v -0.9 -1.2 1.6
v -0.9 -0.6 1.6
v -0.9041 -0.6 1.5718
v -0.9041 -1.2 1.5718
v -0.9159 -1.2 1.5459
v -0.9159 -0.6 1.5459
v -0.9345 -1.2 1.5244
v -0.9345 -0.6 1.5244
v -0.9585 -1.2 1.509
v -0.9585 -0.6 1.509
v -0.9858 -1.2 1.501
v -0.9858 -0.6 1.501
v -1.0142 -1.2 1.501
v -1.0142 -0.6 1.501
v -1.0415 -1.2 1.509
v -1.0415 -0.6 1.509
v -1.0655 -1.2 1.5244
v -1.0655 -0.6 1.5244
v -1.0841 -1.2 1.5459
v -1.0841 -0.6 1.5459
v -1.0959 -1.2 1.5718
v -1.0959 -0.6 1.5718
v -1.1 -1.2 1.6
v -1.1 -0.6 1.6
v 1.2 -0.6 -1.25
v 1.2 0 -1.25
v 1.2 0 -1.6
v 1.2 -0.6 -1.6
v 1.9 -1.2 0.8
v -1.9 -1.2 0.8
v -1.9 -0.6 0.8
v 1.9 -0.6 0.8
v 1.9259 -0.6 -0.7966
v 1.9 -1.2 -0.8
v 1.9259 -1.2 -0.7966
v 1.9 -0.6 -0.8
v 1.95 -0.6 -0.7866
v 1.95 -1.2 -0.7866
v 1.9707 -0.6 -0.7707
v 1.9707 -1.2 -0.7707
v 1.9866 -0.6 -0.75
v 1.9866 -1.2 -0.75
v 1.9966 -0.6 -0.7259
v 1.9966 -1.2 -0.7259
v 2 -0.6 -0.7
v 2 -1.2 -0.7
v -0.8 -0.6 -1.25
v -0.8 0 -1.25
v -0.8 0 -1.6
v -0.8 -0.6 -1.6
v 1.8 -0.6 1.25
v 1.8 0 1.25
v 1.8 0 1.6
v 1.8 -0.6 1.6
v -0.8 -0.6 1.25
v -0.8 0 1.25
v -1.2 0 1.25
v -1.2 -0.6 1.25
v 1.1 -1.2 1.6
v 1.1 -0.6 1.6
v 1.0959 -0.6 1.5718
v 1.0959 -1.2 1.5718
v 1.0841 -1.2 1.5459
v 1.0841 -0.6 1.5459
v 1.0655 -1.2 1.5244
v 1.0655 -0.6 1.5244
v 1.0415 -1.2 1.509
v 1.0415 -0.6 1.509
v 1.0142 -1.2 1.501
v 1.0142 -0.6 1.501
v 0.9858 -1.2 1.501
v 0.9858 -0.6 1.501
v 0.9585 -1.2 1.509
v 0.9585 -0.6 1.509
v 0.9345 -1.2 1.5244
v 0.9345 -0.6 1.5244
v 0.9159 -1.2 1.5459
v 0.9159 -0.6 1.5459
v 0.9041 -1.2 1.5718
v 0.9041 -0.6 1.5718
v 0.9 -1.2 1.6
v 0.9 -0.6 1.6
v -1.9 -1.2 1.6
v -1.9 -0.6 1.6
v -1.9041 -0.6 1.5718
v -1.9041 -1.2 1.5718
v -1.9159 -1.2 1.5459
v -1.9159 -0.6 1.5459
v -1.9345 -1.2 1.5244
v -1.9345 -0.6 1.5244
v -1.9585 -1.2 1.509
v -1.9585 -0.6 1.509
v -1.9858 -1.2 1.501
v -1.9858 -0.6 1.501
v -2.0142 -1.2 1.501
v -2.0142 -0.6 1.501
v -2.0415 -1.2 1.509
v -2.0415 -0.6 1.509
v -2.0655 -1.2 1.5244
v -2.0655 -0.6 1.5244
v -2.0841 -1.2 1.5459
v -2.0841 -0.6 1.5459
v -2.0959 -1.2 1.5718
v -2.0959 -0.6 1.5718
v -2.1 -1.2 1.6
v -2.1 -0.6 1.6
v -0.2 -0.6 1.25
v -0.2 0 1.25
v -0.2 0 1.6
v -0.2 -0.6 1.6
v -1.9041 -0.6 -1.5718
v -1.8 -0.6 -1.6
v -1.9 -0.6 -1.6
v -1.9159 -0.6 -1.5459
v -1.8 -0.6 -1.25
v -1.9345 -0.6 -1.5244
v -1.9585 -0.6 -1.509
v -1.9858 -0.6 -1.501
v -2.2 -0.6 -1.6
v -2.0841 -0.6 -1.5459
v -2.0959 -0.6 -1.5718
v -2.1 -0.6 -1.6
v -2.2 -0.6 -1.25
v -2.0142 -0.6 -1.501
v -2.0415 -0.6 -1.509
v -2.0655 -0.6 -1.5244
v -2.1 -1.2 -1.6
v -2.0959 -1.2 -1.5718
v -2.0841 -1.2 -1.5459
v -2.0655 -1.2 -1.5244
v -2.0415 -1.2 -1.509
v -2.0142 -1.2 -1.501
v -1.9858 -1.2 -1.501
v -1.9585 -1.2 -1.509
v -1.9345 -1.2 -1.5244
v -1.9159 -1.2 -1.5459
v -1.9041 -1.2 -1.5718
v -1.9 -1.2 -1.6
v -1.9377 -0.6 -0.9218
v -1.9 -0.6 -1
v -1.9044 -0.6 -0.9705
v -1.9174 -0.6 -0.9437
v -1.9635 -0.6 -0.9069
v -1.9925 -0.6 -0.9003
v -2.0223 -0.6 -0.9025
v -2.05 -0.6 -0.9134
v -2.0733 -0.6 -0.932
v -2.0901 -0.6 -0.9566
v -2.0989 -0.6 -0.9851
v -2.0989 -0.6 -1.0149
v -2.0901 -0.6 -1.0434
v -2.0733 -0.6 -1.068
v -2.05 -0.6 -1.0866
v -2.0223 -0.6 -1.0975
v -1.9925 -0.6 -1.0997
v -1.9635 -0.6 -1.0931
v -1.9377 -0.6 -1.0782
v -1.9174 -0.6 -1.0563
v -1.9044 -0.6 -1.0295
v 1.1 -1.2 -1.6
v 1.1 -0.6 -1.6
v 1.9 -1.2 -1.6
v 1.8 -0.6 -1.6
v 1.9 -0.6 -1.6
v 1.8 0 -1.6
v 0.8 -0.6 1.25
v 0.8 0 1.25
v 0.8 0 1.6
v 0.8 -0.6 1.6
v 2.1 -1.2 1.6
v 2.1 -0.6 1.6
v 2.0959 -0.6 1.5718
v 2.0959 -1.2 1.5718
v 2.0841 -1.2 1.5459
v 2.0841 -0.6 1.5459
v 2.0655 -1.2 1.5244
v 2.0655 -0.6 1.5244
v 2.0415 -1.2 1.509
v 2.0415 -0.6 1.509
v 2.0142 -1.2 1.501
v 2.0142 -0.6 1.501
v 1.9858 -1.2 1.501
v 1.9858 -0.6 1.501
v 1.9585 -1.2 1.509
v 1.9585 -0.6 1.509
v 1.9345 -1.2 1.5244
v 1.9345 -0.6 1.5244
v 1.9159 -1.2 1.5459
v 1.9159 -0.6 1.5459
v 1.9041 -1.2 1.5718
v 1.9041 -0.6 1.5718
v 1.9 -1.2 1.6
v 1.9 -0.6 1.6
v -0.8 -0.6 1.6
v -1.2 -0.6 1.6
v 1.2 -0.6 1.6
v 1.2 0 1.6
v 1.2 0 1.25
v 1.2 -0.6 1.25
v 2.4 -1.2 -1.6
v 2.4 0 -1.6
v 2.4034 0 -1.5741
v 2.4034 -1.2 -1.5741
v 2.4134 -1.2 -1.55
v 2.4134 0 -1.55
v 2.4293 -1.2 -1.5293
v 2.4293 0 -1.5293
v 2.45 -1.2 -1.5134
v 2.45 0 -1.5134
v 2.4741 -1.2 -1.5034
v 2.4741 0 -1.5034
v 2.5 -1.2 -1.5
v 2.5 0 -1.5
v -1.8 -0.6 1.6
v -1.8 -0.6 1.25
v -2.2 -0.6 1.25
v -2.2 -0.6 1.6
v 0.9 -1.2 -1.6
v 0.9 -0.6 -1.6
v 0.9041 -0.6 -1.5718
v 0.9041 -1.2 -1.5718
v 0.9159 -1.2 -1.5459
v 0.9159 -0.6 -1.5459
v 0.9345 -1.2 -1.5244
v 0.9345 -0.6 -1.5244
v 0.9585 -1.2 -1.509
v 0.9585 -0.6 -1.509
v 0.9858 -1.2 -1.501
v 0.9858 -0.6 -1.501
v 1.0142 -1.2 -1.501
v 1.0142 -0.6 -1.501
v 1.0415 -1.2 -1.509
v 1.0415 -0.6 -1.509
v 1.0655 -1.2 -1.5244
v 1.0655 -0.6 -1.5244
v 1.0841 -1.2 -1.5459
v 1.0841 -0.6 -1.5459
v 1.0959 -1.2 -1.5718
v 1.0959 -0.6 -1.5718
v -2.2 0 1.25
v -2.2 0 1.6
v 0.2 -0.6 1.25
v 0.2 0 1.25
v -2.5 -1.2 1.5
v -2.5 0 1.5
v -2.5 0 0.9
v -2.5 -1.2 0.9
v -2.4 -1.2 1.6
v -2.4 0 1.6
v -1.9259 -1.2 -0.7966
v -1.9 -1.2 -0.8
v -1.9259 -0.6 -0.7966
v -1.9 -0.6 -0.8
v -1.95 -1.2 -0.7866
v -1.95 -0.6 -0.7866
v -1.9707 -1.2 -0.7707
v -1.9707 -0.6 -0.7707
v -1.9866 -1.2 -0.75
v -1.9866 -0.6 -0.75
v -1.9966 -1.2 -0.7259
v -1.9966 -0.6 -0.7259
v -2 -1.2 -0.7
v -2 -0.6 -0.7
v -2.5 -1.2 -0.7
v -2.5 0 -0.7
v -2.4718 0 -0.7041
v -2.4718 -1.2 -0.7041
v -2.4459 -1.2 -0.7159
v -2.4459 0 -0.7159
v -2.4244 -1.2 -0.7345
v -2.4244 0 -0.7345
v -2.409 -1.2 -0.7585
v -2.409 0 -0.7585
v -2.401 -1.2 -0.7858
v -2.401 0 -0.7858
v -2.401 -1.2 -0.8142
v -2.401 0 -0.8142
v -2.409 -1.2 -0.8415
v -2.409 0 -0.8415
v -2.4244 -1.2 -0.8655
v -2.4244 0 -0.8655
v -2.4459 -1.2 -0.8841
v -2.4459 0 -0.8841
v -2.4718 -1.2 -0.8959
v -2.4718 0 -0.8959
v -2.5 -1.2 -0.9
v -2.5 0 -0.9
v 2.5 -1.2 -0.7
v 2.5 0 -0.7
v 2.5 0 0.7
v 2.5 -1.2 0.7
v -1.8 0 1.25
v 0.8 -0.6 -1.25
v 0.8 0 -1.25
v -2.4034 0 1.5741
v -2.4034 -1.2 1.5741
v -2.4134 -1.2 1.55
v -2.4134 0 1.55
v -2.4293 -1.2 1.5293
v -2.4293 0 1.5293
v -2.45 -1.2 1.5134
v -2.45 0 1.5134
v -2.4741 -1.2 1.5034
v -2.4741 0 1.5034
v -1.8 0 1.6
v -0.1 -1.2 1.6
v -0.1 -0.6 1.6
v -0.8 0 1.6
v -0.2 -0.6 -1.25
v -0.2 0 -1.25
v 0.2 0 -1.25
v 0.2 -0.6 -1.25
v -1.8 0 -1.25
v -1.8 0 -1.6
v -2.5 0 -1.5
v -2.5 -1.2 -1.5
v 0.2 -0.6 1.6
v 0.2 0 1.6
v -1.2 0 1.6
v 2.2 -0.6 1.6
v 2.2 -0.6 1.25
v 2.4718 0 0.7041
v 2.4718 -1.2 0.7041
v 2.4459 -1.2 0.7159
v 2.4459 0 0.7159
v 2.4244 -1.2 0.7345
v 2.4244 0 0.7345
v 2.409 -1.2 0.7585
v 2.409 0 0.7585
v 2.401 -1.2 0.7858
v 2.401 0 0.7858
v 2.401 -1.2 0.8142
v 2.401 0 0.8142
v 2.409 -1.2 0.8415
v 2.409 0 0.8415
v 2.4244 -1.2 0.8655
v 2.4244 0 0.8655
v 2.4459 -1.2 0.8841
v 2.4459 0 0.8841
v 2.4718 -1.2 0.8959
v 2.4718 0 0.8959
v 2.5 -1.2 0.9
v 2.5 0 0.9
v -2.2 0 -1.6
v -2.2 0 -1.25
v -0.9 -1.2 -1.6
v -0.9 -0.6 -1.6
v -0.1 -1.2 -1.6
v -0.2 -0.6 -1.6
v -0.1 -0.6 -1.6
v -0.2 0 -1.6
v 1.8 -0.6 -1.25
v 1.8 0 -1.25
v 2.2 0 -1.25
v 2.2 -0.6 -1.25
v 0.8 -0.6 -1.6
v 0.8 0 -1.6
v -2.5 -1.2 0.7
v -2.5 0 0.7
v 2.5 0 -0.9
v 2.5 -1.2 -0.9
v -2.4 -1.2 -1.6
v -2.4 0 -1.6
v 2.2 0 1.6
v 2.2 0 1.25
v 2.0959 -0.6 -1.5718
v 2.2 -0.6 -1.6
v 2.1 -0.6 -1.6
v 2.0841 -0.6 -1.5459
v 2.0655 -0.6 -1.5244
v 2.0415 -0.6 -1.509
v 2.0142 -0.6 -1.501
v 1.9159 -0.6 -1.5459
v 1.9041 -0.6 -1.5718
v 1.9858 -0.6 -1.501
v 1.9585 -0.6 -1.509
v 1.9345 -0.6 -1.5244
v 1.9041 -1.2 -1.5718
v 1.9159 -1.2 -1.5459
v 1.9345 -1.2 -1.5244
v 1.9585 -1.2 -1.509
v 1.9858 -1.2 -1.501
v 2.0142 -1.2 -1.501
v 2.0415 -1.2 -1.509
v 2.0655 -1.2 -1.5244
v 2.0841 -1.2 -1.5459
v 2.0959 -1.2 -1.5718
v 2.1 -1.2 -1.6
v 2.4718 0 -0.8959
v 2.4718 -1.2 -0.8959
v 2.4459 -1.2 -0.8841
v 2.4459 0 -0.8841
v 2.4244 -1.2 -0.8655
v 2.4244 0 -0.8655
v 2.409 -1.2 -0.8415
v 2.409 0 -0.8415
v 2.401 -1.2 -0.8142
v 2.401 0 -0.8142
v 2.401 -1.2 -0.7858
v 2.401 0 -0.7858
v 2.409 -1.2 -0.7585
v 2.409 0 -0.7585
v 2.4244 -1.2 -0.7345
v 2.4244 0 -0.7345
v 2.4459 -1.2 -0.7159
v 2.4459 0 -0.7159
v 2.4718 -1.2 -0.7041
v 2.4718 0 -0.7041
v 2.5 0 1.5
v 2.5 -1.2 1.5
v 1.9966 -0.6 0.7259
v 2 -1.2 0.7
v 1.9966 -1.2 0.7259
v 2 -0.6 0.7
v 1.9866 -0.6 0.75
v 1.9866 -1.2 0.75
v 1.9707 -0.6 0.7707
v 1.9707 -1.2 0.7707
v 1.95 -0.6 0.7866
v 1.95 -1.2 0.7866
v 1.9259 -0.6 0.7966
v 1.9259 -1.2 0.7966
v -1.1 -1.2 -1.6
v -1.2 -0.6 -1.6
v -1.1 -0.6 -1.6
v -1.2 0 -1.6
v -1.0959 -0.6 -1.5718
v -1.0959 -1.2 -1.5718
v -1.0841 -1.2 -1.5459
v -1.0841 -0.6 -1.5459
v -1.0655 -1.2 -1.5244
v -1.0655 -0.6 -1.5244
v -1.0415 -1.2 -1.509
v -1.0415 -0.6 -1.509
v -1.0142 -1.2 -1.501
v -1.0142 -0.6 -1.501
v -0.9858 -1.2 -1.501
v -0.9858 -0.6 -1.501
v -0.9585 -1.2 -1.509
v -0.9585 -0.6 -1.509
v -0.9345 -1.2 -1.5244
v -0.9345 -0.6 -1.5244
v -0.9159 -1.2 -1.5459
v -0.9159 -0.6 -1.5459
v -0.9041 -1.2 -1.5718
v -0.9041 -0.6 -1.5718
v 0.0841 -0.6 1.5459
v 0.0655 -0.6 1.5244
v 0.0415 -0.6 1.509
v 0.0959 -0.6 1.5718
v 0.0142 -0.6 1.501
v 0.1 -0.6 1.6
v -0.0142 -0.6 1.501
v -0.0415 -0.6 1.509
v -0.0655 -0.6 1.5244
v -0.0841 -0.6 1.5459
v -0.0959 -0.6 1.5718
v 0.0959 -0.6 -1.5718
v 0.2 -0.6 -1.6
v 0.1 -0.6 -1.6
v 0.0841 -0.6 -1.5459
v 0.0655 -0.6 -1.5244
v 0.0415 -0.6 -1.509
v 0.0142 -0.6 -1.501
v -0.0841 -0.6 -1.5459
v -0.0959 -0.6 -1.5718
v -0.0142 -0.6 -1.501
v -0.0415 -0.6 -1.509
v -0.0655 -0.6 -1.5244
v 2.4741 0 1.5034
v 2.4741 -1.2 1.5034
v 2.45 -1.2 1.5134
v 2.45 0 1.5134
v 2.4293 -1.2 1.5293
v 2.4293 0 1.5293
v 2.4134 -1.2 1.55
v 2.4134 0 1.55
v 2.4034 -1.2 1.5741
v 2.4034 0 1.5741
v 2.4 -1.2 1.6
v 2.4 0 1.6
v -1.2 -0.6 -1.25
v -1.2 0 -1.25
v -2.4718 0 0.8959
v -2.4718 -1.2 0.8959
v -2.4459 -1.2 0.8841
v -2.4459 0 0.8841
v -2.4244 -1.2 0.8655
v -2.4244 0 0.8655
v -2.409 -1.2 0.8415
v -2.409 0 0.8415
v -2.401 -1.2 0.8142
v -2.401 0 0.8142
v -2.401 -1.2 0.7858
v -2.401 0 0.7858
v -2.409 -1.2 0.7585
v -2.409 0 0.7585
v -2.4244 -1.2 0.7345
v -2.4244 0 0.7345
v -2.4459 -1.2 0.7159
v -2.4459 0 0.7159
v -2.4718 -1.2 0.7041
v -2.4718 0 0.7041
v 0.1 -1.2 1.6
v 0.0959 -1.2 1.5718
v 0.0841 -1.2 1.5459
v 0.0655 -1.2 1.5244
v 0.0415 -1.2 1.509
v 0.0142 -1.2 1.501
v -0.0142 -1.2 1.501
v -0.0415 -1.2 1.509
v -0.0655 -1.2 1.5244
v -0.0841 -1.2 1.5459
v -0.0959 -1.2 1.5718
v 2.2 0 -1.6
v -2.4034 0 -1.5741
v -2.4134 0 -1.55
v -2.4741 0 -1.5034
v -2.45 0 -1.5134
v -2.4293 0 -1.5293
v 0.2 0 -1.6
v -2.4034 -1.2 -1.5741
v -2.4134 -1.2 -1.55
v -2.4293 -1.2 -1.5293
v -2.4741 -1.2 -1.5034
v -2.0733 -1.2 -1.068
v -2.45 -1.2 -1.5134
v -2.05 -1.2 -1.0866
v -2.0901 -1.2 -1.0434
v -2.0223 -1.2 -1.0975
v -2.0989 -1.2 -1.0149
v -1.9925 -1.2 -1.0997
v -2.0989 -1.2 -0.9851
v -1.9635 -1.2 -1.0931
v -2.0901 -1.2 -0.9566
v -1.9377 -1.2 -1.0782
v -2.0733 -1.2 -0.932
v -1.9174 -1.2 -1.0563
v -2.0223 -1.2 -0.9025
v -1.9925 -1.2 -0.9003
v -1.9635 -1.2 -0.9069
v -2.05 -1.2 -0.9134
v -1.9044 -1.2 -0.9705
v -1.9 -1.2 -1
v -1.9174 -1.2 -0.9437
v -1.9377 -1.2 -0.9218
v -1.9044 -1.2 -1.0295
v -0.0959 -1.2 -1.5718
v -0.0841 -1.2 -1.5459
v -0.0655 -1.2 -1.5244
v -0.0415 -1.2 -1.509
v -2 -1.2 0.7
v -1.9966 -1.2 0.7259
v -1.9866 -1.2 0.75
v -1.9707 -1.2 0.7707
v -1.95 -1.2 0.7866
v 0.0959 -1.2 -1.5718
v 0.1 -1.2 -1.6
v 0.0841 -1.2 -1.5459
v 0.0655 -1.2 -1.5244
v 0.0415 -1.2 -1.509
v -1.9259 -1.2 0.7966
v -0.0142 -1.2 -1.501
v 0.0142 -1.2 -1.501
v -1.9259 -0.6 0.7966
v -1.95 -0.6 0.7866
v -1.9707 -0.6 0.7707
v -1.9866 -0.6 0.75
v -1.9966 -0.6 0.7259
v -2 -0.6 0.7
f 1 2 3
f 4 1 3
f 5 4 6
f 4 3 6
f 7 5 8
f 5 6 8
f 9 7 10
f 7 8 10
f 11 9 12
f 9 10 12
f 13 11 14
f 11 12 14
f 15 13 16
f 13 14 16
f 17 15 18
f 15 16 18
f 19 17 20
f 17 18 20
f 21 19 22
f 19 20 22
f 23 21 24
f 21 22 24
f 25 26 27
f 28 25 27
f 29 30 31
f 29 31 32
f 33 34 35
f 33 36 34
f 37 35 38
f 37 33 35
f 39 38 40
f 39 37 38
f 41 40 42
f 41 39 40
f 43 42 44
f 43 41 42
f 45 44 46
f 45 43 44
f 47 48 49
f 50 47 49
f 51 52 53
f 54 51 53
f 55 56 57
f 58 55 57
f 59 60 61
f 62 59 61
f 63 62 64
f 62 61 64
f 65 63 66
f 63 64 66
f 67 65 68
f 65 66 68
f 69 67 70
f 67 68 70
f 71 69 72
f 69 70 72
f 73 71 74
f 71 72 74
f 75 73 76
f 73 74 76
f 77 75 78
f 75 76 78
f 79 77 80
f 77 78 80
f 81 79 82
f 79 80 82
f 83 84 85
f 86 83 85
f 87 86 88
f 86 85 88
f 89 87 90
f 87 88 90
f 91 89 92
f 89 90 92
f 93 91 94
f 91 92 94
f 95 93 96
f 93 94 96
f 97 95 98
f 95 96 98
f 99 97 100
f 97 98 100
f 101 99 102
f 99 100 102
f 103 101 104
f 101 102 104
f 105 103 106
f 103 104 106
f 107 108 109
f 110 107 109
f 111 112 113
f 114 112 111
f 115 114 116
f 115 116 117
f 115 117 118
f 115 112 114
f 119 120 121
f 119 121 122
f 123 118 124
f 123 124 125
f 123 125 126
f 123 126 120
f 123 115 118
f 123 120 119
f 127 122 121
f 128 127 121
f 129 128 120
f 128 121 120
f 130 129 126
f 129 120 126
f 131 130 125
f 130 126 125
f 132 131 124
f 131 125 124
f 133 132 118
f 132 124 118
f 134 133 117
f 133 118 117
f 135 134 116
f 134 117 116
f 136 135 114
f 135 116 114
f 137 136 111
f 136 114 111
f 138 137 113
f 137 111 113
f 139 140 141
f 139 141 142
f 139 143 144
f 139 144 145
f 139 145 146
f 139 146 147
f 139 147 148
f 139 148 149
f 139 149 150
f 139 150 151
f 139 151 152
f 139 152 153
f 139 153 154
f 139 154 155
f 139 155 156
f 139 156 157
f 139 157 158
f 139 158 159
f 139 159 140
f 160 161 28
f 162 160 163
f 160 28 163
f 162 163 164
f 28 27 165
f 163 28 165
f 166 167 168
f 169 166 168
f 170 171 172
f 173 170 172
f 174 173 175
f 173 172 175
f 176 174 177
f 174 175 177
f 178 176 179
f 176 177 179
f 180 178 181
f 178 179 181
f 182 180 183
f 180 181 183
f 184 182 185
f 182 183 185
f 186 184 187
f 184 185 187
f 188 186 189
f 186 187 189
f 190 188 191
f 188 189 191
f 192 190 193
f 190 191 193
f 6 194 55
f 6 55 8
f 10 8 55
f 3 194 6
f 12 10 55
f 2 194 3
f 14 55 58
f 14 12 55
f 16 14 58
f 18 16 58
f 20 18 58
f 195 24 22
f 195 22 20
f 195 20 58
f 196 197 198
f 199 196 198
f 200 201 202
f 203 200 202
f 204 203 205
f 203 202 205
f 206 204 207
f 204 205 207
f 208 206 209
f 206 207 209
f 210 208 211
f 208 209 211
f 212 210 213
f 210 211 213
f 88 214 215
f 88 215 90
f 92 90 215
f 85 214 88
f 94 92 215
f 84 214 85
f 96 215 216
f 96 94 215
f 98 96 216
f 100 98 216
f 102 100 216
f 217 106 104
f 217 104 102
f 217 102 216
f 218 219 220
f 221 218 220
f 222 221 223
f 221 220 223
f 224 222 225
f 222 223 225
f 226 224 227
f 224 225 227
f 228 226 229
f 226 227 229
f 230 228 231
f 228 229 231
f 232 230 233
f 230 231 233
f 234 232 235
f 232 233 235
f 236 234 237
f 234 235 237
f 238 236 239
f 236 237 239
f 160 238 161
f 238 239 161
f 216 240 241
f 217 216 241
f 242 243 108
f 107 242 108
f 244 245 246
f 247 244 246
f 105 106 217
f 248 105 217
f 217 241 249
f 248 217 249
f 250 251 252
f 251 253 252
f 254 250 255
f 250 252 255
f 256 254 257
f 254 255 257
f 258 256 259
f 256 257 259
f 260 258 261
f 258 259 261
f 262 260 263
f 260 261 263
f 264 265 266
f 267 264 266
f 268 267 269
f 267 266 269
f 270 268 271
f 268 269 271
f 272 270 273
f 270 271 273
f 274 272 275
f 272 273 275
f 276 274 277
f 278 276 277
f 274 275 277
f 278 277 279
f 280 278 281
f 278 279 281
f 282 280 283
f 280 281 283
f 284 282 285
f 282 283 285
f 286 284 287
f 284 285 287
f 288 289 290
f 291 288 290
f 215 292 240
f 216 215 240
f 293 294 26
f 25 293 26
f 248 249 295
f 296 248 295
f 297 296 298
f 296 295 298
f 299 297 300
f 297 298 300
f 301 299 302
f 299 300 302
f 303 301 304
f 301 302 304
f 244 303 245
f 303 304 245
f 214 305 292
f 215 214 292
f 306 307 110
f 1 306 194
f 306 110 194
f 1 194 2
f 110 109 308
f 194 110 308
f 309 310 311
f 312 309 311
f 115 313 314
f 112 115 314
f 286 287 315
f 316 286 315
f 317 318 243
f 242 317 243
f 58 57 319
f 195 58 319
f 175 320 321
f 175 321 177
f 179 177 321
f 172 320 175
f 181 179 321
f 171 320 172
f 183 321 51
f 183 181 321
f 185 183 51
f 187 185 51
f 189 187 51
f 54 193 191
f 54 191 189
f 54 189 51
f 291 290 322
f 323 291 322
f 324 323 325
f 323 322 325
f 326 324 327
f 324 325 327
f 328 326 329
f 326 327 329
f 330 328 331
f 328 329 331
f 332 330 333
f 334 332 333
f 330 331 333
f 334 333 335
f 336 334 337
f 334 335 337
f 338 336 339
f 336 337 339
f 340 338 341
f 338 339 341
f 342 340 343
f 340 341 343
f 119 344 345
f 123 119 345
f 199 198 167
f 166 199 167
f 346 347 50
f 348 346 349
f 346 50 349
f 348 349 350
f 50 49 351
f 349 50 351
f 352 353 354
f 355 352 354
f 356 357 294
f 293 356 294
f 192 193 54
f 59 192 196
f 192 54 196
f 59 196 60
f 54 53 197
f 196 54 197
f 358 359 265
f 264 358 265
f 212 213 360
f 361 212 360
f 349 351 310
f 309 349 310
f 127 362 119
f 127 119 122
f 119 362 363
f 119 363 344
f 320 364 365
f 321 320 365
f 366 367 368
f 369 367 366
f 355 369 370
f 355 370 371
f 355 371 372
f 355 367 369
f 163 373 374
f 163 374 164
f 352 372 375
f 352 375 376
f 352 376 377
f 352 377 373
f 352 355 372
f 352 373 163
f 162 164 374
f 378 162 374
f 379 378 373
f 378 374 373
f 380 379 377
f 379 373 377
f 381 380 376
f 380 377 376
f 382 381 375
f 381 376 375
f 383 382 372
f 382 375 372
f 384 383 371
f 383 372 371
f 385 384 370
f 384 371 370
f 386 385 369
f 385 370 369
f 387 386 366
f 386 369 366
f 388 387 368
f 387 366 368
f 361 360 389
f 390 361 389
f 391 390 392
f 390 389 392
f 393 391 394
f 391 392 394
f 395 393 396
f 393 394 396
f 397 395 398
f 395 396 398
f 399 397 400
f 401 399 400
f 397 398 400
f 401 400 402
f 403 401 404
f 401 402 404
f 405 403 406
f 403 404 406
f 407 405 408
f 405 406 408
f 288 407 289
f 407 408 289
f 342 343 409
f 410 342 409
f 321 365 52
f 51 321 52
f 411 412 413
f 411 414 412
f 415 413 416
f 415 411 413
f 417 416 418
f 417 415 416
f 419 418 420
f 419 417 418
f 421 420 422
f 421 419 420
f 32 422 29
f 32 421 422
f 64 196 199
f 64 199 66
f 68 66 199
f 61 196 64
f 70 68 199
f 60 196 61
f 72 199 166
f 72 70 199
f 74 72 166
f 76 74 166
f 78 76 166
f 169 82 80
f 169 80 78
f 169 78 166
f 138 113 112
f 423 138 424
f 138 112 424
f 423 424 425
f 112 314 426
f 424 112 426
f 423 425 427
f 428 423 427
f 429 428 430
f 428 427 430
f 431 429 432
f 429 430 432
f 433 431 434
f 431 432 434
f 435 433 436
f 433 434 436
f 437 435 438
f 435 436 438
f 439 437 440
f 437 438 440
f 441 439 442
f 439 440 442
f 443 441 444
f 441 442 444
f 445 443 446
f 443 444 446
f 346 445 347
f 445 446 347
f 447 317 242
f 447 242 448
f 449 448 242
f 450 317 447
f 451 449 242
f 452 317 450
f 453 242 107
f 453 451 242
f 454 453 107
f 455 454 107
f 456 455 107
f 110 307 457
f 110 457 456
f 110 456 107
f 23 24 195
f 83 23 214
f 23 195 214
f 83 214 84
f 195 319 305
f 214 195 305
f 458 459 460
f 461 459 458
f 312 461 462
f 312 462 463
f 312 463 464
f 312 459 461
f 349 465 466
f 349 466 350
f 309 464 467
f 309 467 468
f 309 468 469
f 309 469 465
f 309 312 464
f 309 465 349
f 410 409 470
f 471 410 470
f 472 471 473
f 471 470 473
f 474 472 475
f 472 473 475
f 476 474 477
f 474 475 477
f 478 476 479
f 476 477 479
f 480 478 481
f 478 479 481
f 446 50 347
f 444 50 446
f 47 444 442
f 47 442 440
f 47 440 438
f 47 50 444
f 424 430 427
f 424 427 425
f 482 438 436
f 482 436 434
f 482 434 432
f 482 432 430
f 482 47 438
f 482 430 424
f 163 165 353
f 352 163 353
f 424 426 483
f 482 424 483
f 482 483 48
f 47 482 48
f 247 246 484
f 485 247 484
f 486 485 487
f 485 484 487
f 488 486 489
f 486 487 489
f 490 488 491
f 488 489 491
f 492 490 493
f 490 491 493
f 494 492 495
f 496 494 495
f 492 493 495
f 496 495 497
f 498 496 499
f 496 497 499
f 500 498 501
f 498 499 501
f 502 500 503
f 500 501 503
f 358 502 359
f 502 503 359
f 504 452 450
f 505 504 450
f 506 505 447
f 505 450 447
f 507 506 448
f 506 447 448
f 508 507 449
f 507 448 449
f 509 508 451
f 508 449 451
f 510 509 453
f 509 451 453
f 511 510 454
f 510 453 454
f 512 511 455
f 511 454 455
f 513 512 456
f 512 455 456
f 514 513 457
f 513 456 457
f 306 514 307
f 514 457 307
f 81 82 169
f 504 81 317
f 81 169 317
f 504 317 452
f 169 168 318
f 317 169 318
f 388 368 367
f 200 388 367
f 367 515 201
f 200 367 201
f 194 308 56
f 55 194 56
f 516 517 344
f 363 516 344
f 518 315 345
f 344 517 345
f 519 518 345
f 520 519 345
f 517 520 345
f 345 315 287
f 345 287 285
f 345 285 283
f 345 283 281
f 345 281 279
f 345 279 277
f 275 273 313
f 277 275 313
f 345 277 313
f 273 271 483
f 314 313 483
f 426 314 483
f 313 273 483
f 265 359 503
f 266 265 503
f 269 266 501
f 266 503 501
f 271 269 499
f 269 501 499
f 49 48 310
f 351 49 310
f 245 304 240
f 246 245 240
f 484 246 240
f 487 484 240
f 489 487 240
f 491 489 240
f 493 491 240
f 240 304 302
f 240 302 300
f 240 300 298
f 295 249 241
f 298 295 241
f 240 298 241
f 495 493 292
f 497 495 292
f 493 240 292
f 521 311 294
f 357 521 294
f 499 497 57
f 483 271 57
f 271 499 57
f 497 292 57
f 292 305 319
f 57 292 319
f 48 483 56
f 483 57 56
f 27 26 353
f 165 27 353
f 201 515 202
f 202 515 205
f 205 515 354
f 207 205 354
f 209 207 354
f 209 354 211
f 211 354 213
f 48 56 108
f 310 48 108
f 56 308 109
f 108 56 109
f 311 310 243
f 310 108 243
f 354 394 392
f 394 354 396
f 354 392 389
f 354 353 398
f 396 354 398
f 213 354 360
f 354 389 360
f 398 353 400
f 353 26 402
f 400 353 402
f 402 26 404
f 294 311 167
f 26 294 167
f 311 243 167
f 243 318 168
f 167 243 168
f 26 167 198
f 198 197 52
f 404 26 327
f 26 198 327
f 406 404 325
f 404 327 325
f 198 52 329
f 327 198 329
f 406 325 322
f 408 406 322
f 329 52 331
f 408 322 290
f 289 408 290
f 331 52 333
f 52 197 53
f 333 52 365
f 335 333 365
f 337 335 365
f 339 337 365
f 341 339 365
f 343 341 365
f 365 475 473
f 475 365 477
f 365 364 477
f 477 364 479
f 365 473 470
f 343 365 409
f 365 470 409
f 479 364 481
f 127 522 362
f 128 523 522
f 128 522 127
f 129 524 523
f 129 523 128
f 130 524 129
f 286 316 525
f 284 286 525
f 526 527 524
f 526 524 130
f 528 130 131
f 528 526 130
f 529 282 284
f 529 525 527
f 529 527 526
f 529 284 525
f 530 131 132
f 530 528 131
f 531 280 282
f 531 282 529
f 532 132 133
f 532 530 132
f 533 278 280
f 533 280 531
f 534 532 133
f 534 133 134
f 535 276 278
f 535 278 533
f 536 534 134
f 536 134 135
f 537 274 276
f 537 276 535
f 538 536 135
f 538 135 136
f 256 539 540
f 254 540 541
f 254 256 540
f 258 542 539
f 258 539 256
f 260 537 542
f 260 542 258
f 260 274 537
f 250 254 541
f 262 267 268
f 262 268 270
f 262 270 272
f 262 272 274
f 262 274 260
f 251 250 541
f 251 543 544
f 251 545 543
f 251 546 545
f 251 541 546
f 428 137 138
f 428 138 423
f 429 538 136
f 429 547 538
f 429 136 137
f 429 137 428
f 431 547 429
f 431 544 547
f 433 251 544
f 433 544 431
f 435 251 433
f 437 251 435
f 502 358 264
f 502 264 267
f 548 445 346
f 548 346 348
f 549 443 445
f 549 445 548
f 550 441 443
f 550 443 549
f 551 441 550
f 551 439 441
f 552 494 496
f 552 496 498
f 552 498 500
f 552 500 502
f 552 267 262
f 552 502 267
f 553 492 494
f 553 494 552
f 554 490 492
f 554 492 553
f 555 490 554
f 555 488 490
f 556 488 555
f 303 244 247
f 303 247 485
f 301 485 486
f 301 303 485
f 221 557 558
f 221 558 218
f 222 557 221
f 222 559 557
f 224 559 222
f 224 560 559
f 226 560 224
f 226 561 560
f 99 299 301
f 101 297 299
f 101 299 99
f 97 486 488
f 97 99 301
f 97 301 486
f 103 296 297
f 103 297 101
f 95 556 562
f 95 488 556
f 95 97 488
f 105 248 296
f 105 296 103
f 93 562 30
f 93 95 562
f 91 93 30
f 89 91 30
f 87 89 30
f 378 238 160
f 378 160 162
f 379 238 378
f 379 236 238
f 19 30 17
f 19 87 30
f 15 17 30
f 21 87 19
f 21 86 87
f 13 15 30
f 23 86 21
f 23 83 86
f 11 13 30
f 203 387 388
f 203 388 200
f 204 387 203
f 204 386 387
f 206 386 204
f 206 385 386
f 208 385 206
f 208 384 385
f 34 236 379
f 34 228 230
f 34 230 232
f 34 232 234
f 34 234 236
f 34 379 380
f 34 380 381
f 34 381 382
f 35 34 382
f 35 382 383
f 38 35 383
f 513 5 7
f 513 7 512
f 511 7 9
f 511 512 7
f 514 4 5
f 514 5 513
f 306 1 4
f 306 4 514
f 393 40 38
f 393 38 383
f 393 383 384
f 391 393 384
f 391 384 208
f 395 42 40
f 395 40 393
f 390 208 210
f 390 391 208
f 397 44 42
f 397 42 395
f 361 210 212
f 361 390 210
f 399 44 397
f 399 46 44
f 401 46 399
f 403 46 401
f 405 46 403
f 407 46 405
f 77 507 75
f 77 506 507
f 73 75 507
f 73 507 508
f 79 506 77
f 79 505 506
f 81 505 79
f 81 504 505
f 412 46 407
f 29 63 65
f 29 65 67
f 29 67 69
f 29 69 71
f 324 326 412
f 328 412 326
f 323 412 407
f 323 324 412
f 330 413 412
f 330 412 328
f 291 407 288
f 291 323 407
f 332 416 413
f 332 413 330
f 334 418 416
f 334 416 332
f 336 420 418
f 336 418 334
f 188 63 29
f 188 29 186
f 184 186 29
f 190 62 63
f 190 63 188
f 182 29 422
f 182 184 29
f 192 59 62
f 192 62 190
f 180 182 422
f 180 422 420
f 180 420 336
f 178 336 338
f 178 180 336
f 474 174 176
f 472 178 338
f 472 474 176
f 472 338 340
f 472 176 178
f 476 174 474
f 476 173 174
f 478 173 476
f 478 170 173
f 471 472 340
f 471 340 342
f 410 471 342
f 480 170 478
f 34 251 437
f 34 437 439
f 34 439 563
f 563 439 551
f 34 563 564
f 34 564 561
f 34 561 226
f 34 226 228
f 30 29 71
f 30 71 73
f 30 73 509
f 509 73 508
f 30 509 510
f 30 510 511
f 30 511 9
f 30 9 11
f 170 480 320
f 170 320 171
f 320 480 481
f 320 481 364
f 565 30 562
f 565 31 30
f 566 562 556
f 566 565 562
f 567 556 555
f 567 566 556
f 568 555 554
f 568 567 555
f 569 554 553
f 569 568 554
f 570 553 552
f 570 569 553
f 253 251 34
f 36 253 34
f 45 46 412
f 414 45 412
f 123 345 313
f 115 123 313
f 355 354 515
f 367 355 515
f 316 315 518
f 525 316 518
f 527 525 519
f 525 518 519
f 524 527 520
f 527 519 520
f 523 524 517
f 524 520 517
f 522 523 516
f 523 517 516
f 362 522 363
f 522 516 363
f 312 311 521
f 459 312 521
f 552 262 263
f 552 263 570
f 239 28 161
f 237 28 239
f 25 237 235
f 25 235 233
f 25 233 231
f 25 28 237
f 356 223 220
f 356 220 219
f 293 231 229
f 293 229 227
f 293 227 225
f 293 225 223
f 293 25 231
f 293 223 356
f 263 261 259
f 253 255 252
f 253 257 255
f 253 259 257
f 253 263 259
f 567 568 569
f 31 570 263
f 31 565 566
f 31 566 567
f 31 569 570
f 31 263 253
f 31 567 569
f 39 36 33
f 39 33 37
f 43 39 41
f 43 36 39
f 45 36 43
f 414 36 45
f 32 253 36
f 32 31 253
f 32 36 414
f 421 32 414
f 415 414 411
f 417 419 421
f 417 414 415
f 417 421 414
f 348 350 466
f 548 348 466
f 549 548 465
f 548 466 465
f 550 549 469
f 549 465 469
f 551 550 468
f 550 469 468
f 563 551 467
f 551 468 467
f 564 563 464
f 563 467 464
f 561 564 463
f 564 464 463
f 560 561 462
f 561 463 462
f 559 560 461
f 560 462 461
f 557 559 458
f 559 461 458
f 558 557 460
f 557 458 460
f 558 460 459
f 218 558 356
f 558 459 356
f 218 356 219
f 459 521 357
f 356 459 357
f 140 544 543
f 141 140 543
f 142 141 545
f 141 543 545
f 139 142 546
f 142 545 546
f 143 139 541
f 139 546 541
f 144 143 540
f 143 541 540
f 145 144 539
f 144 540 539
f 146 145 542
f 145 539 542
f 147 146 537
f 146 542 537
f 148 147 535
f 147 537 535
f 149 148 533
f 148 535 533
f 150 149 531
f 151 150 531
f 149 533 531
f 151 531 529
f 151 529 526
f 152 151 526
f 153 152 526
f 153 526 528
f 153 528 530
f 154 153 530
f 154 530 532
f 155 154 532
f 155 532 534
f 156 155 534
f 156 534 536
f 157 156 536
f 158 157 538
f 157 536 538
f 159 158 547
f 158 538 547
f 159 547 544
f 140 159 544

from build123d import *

# Parameters (mm, degrees)
F1_DEPTH = 1.2
F2_R     = 0.1
F3_DEPTH = 0.6
F4_W     = 4
F4_H     = 1.6
F5_DEPTH = 0.6
F6_R     = 0.1
F8_DEPTH = 0.6


with BuildPart() as f1:
    # F0 (on Front) → F1 (new body)
    with BuildSketch(Plane.XZ):
        with BuildLine():
            Line((-2.1, 1.6), (-2.4, 1.6))
            ThreePointArc((-2.4, 1.6), (-2.429289, 1.529289), (-2.5, 1.5))
            Line((-2.5, 1.5), (-2.5, 0.9))
            ThreePointArc((-2.5, 0.9), (-2.4, 0.8), (-2.5, 0.7))
            Line((-2.5, 0.7), (-2.5, -0.7))
            ThreePointArc((-2.5, -0.7), (-2.4, -0.8), (-2.5, -0.9))
            Line((-2.5, -0.9), (-2.5, -1.5))
            ThreePointArc((-2.5, -1.5), (-2.429289, -1.529289), (-2.4, -1.6))
            Line((-2.4, -1.6), (-2.1, -1.6))
            ThreePointArc((-2.1, -1.6), (-2, -1.5), (-1.9, -1.6))
            Line((-1.9, -1.6), (-1.1, -1.6))
            ThreePointArc((-1.1, -1.6), (-1, -1.5), (-0.9, -1.6))
            Line((-0.9, -1.6), (-0.1, -1.6))
            ThreePointArc((-0.1, -1.6), (0, -1.5), (0.1, -1.6))
            Line((0.1, -1.6), (0.9, -1.6))
            ThreePointArc((0.9, -1.6), (1, -1.5), (1.1, -1.6))
            Line((1.1, -1.6), (1.9, -1.6))
            ThreePointArc((1.9, -1.6), (2, -1.5), (2.1, -1.6))
            Line((2.1, -1.6), (2.4, -1.6))
            ThreePointArc((2.4, -1.6), (2.429289, -1.529289), (2.5, -1.5))
            Line((2.5, -1.5), (2.5, -0.9))
            ThreePointArc((2.5, -0.9), (2.4, -0.8), (2.5, -0.7))
            Line((2.5, -0.7), (2.5, 0.7))
            ThreePointArc((2.5, 0.7), (2.4, 0.8), (2.5, 0.9))
            Line((2.5, 0.9), (2.5, 1.5))
            ThreePointArc((2.5, 1.5), (2.429289, 1.529289), (2.4, 1.6))
            Line((2.4, 1.6), (2.1, 1.6))
            ThreePointArc((2.1, 1.6), (2, 1.5), (1.9, 1.6))
            Line((1.9, 1.6), (1.1, 1.6))
            ThreePointArc((1.1, 1.6), (1, 1.5), (0.9, 1.6))
            Line((0.9, 1.6), (0.1, 1.6))
            ThreePointArc((0.1, 1.6), (0, 1.5), (-0.1, 1.6))
            Line((-0.1, 1.6), (-0.9, 1.6))
            ThreePointArc((-0.9, 1.6), (-1, 1.5), (-1.1, 1.6))
            Line((-1.1, 1.6), (-1.9, 1.6))
            ThreePointArc((-1.9, 1.6), (-2, 1.5), (-2.1, 1.6))
        make_face()
    extrude(amount=F1_DEPTH)

    # F2 (on face) → F3 (cut)
    with BuildSketch(Plane.XZ.offset(1.2)):
        with Locations((-2, -1)):
            Circle(F2_R)
    extrude(amount=-F3_DEPTH, mode=Mode.SUBTRACT)

    # F4 (on face) → F5 (cut)
    with BuildSketch(Plane.XZ.offset(1.2)):
        Rectangle(F4_W, F4_H)
    extrude(amount=-F5_DEPTH, mode=Mode.SUBTRACT)

    # F6
    f6_edges = [f1.edges().sort_by_distance(p)[0] for p in [
        (-2, -0.9, -0.8),
        (2, -0.9, 0.8),
        (2, -0.9, -0.8),
        (-2, -0.9, 0.8),
    ]]
    fillet(f6_edges, radius=F6_R)

    # F7 (on face) → F8 (cut)
    with BuildSketch(Plane(origin=(0, 0, 0), x_dir=(-1, 0, 0), z_dir=(0, 1, 0))):
        with BuildLine():
            Line((-1.8, 1.25), (-1.8, 1.6))
            Line((-1.8, 1.6), (-1.9, 1.6))
            ThreePointArc((-1.9, 1.6), (-2, 1.5), (-2.1, 1.6))
            Line((-2.1, 1.6), (-2.2, 1.6))
            Line((-2.2, 1.6), (-2.2, 1.25))
            Line((-2.2, 1.25), (-1.8, 1.25))
        make_face()
        with BuildLine():
            Line((-0.8, 1.25), (-0.8, 1.6))
            Line((-0.8, 1.6), (-0.9, 1.6))
            ThreePointArc((-0.9, 1.6), (-1, 1.5), (-1.1, 1.6))
            Line((-1.1, 1.6), (-1.2, 1.6))
            Line((-1.2, 1.6), (-1.2, 1.25))
            Line((-1.2, 1.25), (-0.8, 1.25))
        make_face()
        with BuildLine():
            Line((-0.1, 1.6), (-0.2, 1.6))
            Line((-0.2, 1.6), (-0.2, 1.25))
            Line((-0.2, 1.25), (0.2, 1.25))
            Line((0.2, 1.25), (0.2, 1.6))
            Line((0.2, 1.6), (0.1, 1.6))
            ThreePointArc((0.1, 1.6), (0, 1.5), (-0.1, 1.6))
        make_face()
        with BuildLine():
            Line((0.9, 1.6), (0.8, 1.6))
            Line((0.8, 1.6), (0.8, 1.25))
            Line((0.8, 1.25), (1.2, 1.25))
            Line((1.2, 1.25), (1.2, 1.6))
            Line((1.2, 1.6), (1.1, 1.6))
            ThreePointArc((1.1, 1.6), (1, 1.5), (0.9, 1.6))
        make_face()
        with BuildLine():
            Line((1.9, 1.6), (1.8, 1.6))
            Line((1.8, 1.6), (1.8, 1.25))
            Line((1.8, 1.25), (2.2, 1.25))
            Line((2.2, 1.25), (2.2, 1.6))
            Line((2.2, 1.6), (2.1, 1.6))
            ThreePointArc((2.1, 1.6), (2, 1.5), (1.9, 1.6))
        make_face()
        with BuildLine():
            Line((1.8, -1.25), (1.8, -1.6))
            Line((1.8, -1.6), (1.9, -1.6))
            ThreePointArc((1.9, -1.6), (2, -1.5), (2.1, -1.6))
            Line((2.1, -1.6), (2.2, -1.6))
            Line((2.2, -1.6), (2.2, -1.25))
            Line((2.2, -1.25), (1.8, -1.25))
        make_face()
        with BuildLine():
            Line((0.8, -1.25), (0.8, -1.6))
            Line((0.8, -1.6), (0.9, -1.6))
            ThreePointArc((0.9, -1.6), (1, -1.5), (1.1, -1.6))
            Line((1.1, -1.6), (1.2, -1.6))
            Line((1.2, -1.6), (1.2, -1.25))
            Line((1.2, -1.25), (0.8, -1.25))
        make_face()
        with BuildLine():
            Line((0.2, -1.25), (-0.2, -1.25))
            Line((-0.2, -1.25), (-0.2, -1.6))
            Line((-0.2, -1.6), (-0.1, -1.6))
            ThreePointArc((-0.1, -1.6), (0, -1.5), (0.1, -1.6))
            Line((0.1, -1.6), (0.2, -1.6))
            Line((0.2, -1.6), (0.2, -1.25))
        make_face()
        with BuildLine():
            Line((-0.9, -1.6), (-0.8, -1.6))
            Line((-0.8, -1.6), (-0.8, -1.25))
            Line((-0.8, -1.25), (-1.2, -1.25))
            Line((-1.2, -1.25), (-1.2, -1.6))
            Line((-1.2, -1.6), (-1.1, -1.6))
            ThreePointArc((-1.1, -1.6), (-1, -1.5), (-0.9, -1.6))
        make_face()
        with BuildLine():
            Line((-1.9, -1.6), (-1.8, -1.6))
            Line((-1.8, -1.6), (-1.8, -1.25))
            Line((-1.8, -1.25), (-2.2, -1.25))
            Line((-2.2, -1.25), (-2.2, -1.6))
            Line((-2.2, -1.6), (-2.1, -1.6))
            ThreePointArc((-2.1, -1.6), (-2, -1.5), (-1.9, -1.6))
        make_face()
    extrude(amount=-F8_DEPTH, mode=Mode.SUBTRACT)


solid = f1.part
